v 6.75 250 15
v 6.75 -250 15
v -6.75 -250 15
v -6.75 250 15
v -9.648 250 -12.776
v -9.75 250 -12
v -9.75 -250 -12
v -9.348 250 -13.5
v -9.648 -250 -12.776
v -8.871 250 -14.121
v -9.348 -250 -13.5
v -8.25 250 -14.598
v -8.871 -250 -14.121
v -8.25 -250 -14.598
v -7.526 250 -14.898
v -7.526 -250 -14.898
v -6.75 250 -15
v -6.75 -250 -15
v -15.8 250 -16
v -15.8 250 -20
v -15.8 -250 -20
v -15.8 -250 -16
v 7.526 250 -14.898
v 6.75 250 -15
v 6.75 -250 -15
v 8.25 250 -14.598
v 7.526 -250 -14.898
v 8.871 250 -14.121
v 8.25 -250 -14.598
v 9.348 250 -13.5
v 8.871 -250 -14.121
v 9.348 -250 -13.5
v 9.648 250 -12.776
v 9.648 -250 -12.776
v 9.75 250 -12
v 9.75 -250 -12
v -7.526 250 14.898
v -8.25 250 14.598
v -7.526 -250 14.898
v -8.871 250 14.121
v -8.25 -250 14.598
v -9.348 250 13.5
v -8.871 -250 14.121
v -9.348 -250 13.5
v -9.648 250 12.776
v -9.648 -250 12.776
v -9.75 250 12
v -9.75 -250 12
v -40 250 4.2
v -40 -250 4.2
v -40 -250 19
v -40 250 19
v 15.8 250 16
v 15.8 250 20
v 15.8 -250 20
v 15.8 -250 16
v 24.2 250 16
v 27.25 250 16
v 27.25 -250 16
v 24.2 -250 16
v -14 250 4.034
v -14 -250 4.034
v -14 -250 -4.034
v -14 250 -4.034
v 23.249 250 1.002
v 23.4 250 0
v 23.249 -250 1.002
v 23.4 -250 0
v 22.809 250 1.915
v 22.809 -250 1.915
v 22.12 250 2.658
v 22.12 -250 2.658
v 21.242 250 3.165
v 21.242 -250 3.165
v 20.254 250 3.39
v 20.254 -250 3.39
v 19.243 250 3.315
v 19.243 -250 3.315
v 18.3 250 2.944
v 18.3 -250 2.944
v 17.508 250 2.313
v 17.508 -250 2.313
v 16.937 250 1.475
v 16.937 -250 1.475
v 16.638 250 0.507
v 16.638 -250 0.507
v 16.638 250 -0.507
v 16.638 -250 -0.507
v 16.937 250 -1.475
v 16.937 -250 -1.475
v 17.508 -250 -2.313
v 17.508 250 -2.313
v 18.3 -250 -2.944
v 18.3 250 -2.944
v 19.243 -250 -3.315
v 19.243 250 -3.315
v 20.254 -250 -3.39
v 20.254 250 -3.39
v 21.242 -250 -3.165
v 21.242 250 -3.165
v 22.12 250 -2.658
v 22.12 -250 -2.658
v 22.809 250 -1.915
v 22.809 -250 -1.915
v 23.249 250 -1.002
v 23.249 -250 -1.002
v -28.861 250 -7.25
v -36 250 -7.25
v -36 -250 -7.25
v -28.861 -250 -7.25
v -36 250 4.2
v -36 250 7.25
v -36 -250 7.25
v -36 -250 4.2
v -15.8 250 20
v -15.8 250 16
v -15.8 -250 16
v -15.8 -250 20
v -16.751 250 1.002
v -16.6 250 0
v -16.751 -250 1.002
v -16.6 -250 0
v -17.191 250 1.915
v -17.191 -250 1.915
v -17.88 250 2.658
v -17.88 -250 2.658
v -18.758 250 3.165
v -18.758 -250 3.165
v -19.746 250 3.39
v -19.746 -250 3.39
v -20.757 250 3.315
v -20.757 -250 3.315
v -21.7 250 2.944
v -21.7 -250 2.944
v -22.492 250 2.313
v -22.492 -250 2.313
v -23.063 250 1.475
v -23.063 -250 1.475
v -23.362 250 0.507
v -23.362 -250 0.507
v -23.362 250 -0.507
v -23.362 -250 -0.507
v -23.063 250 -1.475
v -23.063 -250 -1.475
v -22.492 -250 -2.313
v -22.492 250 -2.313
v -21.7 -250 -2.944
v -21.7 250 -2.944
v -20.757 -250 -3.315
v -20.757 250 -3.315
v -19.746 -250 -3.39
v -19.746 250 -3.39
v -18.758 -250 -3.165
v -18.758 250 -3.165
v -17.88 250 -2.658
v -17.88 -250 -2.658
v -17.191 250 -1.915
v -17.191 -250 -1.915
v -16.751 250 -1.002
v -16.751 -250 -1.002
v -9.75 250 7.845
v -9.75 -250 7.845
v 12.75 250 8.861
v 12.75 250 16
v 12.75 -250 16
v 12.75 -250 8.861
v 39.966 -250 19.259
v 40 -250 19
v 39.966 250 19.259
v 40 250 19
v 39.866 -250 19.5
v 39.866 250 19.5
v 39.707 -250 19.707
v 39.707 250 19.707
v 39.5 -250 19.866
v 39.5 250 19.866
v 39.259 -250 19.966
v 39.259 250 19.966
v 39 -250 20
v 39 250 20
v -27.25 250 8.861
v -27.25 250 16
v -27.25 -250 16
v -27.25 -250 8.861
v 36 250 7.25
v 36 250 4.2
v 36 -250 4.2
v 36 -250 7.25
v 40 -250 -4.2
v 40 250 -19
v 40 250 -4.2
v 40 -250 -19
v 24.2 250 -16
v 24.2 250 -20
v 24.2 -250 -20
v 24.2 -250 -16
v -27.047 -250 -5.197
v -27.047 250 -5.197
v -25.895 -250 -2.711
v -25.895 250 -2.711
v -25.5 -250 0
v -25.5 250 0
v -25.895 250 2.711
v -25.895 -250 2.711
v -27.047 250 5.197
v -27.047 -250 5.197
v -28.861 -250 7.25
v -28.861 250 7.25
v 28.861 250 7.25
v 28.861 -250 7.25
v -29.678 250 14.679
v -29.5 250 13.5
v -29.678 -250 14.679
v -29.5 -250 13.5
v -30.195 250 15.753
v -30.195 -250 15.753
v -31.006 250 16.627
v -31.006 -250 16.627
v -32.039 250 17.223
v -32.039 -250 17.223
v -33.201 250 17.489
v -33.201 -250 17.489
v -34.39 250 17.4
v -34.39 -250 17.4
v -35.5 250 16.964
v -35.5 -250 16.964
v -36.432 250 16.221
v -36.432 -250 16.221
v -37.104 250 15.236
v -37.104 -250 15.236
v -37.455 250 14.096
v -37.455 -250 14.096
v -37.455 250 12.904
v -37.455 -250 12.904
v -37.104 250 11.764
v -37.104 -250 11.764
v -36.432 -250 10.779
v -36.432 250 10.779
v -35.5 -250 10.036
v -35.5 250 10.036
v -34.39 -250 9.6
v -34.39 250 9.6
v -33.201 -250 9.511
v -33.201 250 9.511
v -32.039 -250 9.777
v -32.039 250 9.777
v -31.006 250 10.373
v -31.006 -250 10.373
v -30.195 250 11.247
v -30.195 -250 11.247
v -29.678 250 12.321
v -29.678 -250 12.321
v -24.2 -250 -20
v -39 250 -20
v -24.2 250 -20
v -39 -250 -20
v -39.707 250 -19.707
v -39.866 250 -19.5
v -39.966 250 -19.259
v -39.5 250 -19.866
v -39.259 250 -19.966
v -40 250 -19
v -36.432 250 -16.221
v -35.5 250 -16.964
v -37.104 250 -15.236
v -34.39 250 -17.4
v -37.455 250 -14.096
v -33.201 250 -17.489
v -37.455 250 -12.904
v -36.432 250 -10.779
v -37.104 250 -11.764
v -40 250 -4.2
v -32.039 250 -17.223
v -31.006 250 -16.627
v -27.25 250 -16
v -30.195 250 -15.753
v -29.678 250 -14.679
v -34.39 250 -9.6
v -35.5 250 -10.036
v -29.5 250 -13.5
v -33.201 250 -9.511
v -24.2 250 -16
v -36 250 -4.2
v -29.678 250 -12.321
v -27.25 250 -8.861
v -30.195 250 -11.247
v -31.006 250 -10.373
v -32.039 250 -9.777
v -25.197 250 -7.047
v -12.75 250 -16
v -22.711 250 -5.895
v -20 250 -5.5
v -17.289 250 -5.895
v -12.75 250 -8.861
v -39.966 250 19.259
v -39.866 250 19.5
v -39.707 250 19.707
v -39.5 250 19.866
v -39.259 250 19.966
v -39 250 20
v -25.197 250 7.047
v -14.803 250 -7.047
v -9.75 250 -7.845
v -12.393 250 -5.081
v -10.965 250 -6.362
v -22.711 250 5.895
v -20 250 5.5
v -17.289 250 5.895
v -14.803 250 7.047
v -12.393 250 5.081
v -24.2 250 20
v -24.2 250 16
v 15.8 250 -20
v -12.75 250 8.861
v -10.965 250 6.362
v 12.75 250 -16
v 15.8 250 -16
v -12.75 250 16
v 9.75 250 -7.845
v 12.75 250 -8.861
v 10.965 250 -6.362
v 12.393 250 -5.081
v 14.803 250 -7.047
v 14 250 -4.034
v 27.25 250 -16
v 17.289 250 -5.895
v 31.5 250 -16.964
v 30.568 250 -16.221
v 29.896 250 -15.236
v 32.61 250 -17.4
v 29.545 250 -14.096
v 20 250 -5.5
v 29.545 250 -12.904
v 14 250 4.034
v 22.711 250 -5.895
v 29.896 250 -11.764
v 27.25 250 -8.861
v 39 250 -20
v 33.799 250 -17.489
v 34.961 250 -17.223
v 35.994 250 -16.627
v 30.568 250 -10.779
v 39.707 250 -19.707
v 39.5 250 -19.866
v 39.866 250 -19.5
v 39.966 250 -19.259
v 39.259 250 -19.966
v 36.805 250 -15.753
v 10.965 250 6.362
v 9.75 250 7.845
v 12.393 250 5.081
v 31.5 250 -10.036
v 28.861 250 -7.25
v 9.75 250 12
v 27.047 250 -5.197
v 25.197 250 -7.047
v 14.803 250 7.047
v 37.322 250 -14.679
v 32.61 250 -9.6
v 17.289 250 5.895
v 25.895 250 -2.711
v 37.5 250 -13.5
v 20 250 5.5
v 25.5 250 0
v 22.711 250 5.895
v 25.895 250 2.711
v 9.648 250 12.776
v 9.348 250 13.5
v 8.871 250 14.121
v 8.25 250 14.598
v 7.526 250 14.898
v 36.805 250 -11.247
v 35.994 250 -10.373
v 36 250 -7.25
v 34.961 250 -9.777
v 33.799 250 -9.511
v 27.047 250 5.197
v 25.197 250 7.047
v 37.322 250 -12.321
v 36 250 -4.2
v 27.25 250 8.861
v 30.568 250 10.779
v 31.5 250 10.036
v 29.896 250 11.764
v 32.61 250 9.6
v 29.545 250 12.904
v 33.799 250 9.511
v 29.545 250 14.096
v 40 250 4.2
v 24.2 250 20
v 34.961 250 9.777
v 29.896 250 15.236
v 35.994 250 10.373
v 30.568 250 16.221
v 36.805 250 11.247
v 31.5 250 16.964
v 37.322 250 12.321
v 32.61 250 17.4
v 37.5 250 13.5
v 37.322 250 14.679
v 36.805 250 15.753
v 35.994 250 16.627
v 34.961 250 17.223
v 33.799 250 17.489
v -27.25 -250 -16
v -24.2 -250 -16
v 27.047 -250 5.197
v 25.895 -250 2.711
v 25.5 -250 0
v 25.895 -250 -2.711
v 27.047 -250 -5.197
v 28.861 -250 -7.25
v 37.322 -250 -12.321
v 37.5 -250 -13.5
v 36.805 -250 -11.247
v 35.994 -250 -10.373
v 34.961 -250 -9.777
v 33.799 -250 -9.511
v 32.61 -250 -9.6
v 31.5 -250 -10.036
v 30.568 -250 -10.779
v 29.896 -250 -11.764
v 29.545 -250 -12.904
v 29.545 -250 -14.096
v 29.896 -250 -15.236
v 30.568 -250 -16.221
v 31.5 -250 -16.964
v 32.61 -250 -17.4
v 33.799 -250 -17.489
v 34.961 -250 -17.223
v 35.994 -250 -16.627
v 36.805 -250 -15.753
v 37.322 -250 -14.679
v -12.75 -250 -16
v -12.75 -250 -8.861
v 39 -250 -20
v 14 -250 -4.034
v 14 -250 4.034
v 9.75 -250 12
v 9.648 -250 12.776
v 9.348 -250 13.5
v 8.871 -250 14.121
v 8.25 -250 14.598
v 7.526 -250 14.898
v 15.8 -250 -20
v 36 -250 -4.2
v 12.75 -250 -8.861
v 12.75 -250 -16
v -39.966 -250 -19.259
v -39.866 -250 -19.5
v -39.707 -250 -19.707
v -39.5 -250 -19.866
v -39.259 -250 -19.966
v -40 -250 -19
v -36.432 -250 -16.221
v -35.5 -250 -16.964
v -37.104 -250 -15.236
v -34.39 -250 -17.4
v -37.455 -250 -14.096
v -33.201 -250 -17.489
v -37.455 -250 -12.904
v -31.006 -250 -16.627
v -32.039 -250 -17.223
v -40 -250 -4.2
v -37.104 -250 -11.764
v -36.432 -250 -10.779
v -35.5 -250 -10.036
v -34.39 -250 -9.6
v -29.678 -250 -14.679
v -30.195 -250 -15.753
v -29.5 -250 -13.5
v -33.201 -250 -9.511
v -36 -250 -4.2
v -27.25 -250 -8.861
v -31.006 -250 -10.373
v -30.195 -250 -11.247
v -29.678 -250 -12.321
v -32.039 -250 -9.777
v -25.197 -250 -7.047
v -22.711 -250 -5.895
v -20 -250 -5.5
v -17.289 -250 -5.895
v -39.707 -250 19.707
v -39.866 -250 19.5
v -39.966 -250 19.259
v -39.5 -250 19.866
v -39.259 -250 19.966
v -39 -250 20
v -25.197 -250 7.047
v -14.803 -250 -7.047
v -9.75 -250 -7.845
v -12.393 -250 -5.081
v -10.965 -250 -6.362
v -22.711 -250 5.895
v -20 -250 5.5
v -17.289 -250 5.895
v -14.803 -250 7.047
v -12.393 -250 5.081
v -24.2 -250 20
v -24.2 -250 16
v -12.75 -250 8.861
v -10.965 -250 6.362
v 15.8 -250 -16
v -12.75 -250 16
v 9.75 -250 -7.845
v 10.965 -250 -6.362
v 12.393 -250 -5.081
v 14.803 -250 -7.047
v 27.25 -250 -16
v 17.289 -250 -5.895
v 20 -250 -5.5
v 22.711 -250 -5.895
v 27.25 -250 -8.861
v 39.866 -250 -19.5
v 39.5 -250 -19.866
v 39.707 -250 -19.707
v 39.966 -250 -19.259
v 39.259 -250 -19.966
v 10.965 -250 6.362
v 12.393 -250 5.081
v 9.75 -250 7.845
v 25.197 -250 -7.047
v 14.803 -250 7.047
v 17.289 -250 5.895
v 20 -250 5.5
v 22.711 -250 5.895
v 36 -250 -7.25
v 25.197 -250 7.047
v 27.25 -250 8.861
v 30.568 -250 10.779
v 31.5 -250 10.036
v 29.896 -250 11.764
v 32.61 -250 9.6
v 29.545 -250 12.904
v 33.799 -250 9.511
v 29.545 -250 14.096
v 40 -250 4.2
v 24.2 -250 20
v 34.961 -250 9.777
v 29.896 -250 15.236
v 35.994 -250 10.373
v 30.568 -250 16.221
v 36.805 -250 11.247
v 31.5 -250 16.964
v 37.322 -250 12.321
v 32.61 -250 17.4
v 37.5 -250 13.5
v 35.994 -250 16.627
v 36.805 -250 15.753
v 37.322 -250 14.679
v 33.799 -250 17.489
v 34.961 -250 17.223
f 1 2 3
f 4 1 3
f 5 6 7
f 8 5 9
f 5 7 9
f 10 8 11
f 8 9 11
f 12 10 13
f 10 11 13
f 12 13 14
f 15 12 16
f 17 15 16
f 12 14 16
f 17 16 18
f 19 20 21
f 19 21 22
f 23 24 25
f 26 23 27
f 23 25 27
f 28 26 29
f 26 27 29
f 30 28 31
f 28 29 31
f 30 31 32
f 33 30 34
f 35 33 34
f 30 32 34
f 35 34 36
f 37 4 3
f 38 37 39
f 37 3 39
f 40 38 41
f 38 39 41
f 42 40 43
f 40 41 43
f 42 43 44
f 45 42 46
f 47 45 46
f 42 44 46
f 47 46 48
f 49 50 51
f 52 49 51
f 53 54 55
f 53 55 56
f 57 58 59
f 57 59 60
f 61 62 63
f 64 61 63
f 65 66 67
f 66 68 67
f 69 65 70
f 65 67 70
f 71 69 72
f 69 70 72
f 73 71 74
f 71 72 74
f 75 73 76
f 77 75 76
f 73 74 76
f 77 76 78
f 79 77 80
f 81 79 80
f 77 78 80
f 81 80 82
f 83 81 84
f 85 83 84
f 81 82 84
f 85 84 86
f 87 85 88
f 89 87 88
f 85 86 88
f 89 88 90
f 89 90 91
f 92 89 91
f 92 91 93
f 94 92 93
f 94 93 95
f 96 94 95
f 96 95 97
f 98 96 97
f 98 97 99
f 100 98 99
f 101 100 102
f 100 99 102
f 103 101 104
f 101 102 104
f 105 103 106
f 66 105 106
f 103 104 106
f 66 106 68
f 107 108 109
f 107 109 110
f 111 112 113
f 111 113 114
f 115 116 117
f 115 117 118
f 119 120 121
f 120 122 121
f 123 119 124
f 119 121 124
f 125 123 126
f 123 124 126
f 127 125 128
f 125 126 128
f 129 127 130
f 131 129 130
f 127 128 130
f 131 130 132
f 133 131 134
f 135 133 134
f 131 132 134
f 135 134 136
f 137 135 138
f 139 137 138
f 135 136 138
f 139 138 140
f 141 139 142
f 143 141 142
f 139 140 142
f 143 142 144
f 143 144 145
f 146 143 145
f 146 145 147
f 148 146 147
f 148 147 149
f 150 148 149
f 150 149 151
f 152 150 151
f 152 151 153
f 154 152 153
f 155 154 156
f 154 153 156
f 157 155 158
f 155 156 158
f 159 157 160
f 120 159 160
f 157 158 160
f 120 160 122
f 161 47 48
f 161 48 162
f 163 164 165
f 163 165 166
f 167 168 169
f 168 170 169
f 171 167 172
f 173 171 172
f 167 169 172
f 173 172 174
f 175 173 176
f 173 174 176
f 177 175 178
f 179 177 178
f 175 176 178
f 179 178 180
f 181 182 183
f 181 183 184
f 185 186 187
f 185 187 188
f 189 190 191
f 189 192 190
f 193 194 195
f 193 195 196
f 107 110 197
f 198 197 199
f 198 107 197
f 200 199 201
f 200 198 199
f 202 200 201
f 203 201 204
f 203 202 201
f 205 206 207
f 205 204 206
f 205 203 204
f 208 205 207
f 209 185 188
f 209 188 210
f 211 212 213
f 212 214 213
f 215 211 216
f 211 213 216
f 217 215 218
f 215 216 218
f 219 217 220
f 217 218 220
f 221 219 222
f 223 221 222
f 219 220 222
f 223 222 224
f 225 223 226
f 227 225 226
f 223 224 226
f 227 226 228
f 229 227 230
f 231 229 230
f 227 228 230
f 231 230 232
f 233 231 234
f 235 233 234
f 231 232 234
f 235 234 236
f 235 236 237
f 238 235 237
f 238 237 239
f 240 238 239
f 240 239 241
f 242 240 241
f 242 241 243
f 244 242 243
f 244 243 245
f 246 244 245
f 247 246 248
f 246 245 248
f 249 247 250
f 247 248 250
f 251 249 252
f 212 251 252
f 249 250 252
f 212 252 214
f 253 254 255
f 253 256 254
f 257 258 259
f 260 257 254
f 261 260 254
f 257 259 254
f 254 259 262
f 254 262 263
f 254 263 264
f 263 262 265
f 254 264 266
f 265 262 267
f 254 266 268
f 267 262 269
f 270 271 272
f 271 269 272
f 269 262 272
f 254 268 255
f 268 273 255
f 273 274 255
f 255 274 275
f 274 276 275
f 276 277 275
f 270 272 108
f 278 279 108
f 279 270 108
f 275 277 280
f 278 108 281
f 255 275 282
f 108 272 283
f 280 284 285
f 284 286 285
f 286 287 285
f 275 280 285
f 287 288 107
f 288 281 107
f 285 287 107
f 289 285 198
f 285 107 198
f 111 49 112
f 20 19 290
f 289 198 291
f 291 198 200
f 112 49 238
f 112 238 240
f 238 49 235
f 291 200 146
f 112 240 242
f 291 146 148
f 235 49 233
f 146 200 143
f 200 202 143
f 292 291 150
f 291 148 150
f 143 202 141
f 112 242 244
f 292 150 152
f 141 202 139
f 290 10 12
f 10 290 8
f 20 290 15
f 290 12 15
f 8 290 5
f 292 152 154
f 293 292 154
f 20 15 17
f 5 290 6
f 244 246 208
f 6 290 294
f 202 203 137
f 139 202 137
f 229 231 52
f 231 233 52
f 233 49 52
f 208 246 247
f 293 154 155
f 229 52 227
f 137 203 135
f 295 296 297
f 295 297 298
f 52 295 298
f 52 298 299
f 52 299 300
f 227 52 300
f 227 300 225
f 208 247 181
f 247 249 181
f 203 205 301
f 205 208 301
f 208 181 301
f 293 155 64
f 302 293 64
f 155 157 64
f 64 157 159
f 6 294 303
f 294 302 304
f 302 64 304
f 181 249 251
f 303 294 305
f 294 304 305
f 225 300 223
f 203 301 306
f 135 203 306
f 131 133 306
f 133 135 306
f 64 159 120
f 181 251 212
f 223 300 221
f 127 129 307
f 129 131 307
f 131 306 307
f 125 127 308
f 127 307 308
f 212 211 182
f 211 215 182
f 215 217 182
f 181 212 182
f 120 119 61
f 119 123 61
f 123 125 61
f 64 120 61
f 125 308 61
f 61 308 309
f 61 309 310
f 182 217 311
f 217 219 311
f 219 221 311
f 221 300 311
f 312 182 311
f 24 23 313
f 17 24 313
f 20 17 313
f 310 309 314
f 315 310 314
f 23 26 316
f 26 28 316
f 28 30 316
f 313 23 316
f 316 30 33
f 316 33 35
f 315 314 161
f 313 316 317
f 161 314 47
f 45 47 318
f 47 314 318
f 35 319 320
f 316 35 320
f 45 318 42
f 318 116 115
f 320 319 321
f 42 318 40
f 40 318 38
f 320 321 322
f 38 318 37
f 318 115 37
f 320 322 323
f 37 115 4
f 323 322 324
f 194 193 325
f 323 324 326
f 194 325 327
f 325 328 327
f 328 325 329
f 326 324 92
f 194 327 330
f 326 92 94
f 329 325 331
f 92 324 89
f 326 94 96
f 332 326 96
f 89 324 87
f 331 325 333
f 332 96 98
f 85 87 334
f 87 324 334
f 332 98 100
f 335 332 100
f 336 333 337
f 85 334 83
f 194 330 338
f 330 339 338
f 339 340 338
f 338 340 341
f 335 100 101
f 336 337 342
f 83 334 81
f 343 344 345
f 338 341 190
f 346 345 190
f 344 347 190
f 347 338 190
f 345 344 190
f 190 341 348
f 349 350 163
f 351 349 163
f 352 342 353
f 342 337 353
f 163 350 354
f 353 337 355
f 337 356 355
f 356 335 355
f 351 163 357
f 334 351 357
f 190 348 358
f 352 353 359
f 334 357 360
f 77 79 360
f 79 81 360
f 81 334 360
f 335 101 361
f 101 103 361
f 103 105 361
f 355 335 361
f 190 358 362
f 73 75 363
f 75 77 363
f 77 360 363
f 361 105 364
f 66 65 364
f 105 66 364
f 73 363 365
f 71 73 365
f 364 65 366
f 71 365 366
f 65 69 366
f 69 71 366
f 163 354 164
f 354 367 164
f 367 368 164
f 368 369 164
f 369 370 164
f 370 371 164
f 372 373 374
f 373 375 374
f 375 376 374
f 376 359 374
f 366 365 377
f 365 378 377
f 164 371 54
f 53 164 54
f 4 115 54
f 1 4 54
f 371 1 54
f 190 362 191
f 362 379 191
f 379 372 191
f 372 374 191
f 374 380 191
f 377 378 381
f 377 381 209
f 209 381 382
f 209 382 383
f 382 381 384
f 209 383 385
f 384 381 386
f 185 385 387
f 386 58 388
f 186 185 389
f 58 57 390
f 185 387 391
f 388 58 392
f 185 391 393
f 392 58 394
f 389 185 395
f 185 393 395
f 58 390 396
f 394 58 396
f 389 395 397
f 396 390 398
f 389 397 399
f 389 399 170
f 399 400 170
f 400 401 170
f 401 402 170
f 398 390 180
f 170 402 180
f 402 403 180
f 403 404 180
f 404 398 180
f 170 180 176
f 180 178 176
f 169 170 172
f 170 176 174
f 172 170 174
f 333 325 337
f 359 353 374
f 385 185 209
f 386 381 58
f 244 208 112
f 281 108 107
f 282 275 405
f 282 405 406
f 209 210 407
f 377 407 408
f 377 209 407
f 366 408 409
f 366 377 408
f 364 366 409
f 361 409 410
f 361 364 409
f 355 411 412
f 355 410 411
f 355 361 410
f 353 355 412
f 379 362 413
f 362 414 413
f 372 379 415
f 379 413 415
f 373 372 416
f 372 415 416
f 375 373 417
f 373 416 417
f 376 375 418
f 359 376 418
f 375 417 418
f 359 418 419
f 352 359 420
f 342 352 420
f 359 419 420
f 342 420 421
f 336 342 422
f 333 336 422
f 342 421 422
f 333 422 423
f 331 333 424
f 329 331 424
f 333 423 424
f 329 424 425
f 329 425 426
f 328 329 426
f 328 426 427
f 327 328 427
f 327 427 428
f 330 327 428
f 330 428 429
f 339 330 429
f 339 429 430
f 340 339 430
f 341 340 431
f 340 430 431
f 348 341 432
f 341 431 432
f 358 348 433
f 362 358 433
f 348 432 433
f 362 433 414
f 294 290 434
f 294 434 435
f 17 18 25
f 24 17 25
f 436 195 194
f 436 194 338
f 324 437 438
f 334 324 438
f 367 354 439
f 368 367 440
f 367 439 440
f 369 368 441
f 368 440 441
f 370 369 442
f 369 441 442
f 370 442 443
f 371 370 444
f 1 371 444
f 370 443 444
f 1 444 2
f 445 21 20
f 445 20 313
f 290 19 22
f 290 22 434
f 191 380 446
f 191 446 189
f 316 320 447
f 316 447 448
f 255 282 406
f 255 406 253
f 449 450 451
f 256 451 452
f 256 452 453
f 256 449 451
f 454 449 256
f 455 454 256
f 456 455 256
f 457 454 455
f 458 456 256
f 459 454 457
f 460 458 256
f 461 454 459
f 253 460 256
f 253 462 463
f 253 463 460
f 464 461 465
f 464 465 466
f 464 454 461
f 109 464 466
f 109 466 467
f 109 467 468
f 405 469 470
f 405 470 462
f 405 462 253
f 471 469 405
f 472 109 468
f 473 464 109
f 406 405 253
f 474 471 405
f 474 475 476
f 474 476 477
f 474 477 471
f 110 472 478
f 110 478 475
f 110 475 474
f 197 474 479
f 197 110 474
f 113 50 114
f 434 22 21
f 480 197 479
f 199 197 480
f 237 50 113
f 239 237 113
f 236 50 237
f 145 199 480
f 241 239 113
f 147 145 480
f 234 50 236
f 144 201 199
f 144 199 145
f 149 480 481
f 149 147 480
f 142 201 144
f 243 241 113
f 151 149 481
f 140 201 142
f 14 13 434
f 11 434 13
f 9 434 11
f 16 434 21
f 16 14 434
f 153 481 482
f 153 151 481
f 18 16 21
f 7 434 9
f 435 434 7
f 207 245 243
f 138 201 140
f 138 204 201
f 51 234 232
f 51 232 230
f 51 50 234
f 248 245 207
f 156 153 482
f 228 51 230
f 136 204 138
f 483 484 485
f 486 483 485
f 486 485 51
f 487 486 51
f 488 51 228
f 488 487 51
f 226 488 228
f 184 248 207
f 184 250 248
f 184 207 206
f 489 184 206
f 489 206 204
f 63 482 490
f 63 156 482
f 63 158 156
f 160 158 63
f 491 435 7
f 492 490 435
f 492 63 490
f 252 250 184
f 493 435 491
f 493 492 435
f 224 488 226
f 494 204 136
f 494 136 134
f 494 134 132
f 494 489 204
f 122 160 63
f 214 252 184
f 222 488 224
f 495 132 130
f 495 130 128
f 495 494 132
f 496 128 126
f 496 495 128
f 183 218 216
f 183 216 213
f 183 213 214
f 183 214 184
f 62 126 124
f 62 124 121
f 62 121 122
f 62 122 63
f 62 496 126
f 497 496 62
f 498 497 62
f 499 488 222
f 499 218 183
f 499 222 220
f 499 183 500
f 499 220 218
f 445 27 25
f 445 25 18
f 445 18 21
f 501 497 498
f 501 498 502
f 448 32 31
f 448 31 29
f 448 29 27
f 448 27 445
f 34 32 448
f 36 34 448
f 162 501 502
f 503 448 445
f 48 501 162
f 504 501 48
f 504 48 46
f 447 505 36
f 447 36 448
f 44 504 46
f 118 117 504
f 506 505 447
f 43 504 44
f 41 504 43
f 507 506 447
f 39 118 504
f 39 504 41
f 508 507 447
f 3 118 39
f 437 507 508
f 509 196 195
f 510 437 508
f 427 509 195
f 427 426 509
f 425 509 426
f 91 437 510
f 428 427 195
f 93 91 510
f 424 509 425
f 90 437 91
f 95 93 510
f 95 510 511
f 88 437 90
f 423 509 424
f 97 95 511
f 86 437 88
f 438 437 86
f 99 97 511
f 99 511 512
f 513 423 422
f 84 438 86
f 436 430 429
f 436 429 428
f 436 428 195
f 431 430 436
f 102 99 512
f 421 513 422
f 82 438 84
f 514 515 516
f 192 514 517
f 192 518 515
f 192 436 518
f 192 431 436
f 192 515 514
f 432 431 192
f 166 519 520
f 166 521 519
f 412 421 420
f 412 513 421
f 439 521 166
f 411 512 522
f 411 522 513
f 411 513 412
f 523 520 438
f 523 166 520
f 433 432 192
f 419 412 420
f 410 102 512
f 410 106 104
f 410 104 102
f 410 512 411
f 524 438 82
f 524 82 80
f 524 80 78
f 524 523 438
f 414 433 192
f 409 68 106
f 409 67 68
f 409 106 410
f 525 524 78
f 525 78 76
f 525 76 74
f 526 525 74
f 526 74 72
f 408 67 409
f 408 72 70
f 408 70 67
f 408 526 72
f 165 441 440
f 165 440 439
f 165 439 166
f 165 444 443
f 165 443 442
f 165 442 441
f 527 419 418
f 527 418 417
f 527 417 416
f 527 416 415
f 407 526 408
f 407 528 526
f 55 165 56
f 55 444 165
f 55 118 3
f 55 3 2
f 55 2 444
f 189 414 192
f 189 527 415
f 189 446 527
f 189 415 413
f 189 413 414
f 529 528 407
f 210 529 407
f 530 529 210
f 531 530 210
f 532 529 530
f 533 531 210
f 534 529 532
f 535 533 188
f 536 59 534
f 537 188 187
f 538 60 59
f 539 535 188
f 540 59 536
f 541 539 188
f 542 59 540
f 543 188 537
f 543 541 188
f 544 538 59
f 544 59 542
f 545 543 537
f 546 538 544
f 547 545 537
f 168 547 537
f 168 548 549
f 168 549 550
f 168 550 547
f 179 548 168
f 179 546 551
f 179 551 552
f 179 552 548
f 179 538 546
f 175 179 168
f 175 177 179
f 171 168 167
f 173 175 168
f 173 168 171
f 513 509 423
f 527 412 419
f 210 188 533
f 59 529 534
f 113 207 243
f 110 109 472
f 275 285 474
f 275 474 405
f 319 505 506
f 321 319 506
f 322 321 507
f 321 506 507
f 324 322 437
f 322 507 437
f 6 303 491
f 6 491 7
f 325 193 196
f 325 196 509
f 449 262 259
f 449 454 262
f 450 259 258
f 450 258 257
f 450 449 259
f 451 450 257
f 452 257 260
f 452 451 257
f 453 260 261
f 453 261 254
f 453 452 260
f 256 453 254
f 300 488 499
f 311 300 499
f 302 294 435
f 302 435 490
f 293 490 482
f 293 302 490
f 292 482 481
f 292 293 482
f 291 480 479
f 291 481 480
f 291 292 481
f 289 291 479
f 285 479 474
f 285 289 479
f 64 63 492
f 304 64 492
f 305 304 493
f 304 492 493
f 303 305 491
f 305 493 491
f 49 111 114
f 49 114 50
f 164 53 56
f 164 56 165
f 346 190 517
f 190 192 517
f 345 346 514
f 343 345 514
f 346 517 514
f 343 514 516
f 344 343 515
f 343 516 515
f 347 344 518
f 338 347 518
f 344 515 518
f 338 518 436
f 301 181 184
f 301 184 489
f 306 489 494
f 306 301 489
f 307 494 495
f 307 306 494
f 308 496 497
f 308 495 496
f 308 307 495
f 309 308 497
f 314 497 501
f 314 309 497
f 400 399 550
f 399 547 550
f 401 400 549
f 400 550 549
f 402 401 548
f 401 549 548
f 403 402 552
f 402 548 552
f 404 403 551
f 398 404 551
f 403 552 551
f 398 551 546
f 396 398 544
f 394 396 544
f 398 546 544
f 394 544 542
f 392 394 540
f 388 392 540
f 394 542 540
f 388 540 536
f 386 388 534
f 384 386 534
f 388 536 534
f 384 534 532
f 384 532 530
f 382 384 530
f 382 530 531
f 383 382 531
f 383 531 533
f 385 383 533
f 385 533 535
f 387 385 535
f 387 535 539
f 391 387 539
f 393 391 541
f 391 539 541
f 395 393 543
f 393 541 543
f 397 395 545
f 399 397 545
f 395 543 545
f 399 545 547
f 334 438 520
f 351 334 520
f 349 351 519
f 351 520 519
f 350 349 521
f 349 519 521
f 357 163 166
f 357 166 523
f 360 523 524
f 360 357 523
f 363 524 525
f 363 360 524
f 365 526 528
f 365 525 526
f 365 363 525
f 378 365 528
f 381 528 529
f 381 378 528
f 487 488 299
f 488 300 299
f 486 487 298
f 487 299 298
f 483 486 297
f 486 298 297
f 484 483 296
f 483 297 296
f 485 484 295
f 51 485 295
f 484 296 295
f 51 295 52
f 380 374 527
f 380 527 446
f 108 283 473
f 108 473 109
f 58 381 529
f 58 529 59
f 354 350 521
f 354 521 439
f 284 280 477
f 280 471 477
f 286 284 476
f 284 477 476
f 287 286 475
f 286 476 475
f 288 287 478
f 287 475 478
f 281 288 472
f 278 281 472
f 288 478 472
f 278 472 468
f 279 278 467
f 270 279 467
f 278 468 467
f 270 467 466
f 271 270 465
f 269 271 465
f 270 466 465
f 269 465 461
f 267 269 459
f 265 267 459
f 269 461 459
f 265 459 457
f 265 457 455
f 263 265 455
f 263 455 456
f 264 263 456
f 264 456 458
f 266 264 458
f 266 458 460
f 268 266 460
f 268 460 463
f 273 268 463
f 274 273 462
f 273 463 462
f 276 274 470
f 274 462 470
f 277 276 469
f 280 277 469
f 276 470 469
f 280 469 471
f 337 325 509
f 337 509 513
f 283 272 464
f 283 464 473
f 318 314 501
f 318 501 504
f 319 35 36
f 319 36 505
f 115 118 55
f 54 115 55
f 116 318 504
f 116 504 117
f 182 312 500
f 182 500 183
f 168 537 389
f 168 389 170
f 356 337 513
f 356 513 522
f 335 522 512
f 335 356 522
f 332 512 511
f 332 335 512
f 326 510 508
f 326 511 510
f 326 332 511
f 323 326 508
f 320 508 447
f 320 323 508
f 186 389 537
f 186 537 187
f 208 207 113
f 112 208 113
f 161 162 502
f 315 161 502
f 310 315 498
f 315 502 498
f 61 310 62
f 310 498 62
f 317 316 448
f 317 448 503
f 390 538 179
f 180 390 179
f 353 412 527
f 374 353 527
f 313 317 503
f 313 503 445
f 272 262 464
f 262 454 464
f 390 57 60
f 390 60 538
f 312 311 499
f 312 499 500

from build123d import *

# Parameters (mm, degrees)
F1_W          = 80
F1_H          = 40
F2_DEPTH      = 250
F3_R          = 4
F3_R_2        = 3.4
F4_DEPTH      = 250.001
F4_DEPTH_BACK = 250.001
F6_DEPTH      = 250.001
F6_DEPTH_BACK = 250.001
F8_DEPTH      = 250.001
F8_DEPTH_BACK = 250.001
F9_R          = 1


with BuildPart() as f2:
    # F1 (on Front) → F2 (new body, symmetric)
    with BuildSketch(Plane.XZ):
        Rectangle(F1_W, F1_H)
    extrude(amount=F2_DEPTH, both=True)

    # F3 (on Front) → F4 (cut, two sides)
    with BuildSketch(Plane.XZ) as f4_sk:
        with Locations((-33.5, 13.5)):
            Circle(F3_R)
        with Locations((-33.5, -13.5)):
            Circle(F3_R)
        with Locations((33.5, -13.5)):
            Circle(F3_R)
        with Locations((33.5, 13.5)):
            Circle(F3_R)
        with Locations((-20, 0)):
            Circle(F3_R_2)
        with Locations((20, 0)):
            Circle(F3_R_2)
    extrude(amount=-F4_DEPTH, mode=Mode.SUBTRACT)
    extrude(f4_sk.sketch, amount=F4_DEPTH_BACK, mode=Mode.SUBTRACT)

    # F5 (on Front) → F6 (cut, two sides)
    with BuildSketch(Plane.XZ) as f6_sk:
        with BuildLine():
            Line((-15.8, 20), (-24.2, 20))
            Line((-24.2, 20), (-24.2, 16))
            Line((-24.2, 16), (-27.25, 16))
            Line((-27.25, 16), (-27.25, 8.8609854211))
            ThreePointArc((-27.25, 8.8609854211), (-20, 5.5), (-12.75, 8.8609854211))
            Line((-12.75, 8.8609854211), (-12.75, 16))
            Line((-12.75, 16), (-15.8, 16))
            Line((-15.8, 16), (-15.8, 20))
        make_face()
        with BuildLine():
            Line((-40, 4.2), (-40, -4.2))
            Line((-40, -4.2), (-36, -4.2))
            Line((-36, -4.2), (-36, -7.25))
            Line((-36, -7.25), (-28.8609854211, -7.25))
            ThreePointArc((-28.8609854211, -7.25), (-25.5, 0), (-28.8609854211, 7.25))
            Line((-28.8609854211, 7.25), (-36, 7.25))
            Line((-36, 7.25), (-36, 4.2))
            Line((-36, 4.2), (-40, 4.2))
        make_face()
        with BuildLine():
            Line((-24.2, -20), (-15.8, -20))
            Line((-15.8, -20), (-15.8, -16))
            Line((-15.8, -16), (-12.75, -16))
            Line((-12.75, -16), (-12.75, -8.8609854211))
            ThreePointArc((-12.75, -8.8609854211), (-20, -5.5), (-27.25, -8.8609854211))
            Line((-27.25, -8.8609854211), (-27.25, -16))
            Line((-27.25, -16), (-24.2, -16))
            Line((-24.2, -16), (-24.2, -20))
        make_face()
        with BuildLine():
            ThreePointArc((27.25, -8.8609854211), (20, -5.5), (12.75, -8.8609854211))
            Line((12.75, -8.8609854211), (12.75, -16))
            Line((12.75, -16), (15.8, -16))
            Line((15.8, -16), (15.8, -20))
            Line((15.8, -20), (24.2, -20))
            Line((24.2, -20), (24.2, -16))
            Line((24.2, -16), (27.25, -16))
            Line((27.25, -16), (27.25, -8.8609854211))
        make_face()
        with BuildLine():
            Line((36, -4.2), (40, -4.2))
            Line((40, -4.2), (40, 4.2))
            Line((40, 4.2), (36, 4.2))
            Line((36, 4.2), (36, 7.25))
            Line((36, 7.25), (28.8609854211, 7.25))
            ThreePointArc((28.8609854211, 7.25), (25.5, 0), (28.8609854211, -7.25))
            Line((28.8609854211, -7.25), (36, -7.25))
            Line((36, -7.25), (36, -4.2))
        make_face()
        with BuildLine():
            Line((15.8, 16), (12.75, 16))
            Line((12.75, 16), (12.75, 8.8609854211))
            ThreePointArc((12.75, 8.8609854211), (20, 5.5), (27.25, 8.8609854211))
            Line((27.25, 8.8609854211), (27.25, 16))
            Line((27.25, 16), (24.2, 16))
            Line((24.2, 16), (24.2, 20))
            Line((24.2, 20), (15.8, 20))
            Line((15.8, 20), (15.8, 16))
        make_face()
    extrude(amount=-F6_DEPTH, mode=Mode.SUBTRACT)
    extrude(f6_sk.sketch, amount=F6_DEPTH_BACK, mode=Mode.SUBTRACT)

    # F7 (on Front) → F8 (cut, two sides)
    with BuildSketch(Plane.XZ) as f8_sk:
        with BuildLine():
            Line((6.75, 15), (-6.75, 15))
            ThreePointArc((-6.75, 15), (-8.8713203436, 14.1213203436), (-9.75, 12))
            Line((-9.75, 12), (-9.75, 7.8454559894))
            ThreePointArc((-9.75, 7.8454559894), (-11.6545131981, 5.6939347714), (-14, 4.0341439003))
            Line((-14, 4.0341439003), (-14, -4.0341439003))
            ThreePointArc((-14, -4.0341439003), (-11.6545131981, -5.6939347714), (-9.75, -7.8454559894))
            Line((-9.75, -7.8454559894), (-9.75, -12))
            ThreePointArc((-9.75, -12), (-8.8713203436, -14.1213203436), (-6.75, -15))
            Line((-6.75, -15), (6.75, -15))
            ThreePointArc((6.75, -15), (8.8713203436, -14.1213203436), (9.75, -12))
            Line((9.75, -12), (9.75, -7.8454559894))
            ThreePointArc((9.75, -7.8454559894), (11.6545131981, -5.6939347714), (14, -4.0341439003))
            Line((14, -4.0341439003), (14, 4.0341439003))
            ThreePointArc((14, 4.0341439003), (11.6545131981, 5.6939347714), (9.75, 7.8454559894))
            Line((9.75, 7.8454559894), (9.75, 12))
            ThreePointArc((9.75, 12), (8.8713203436, 14.1213203436), (6.75, 15))
        make_face()
    extrude(amount=-F8_DEPTH, mode=Mode.SUBTRACT)
    extrude(f8_sk.sketch, amount=F8_DEPTH_BACK, mode=Mode.SUBTRACT)

    # F9
    f9_edges = [f2.edges().sort_by_distance(p)[0] for p in [
        (-40, 0, 20),
        (40, 0, 20),
        (40, 0, -20),
        (-40, 0, -20),
    ]]
    fillet(f9_edges, radius=F9_R)


solid = f2.part
